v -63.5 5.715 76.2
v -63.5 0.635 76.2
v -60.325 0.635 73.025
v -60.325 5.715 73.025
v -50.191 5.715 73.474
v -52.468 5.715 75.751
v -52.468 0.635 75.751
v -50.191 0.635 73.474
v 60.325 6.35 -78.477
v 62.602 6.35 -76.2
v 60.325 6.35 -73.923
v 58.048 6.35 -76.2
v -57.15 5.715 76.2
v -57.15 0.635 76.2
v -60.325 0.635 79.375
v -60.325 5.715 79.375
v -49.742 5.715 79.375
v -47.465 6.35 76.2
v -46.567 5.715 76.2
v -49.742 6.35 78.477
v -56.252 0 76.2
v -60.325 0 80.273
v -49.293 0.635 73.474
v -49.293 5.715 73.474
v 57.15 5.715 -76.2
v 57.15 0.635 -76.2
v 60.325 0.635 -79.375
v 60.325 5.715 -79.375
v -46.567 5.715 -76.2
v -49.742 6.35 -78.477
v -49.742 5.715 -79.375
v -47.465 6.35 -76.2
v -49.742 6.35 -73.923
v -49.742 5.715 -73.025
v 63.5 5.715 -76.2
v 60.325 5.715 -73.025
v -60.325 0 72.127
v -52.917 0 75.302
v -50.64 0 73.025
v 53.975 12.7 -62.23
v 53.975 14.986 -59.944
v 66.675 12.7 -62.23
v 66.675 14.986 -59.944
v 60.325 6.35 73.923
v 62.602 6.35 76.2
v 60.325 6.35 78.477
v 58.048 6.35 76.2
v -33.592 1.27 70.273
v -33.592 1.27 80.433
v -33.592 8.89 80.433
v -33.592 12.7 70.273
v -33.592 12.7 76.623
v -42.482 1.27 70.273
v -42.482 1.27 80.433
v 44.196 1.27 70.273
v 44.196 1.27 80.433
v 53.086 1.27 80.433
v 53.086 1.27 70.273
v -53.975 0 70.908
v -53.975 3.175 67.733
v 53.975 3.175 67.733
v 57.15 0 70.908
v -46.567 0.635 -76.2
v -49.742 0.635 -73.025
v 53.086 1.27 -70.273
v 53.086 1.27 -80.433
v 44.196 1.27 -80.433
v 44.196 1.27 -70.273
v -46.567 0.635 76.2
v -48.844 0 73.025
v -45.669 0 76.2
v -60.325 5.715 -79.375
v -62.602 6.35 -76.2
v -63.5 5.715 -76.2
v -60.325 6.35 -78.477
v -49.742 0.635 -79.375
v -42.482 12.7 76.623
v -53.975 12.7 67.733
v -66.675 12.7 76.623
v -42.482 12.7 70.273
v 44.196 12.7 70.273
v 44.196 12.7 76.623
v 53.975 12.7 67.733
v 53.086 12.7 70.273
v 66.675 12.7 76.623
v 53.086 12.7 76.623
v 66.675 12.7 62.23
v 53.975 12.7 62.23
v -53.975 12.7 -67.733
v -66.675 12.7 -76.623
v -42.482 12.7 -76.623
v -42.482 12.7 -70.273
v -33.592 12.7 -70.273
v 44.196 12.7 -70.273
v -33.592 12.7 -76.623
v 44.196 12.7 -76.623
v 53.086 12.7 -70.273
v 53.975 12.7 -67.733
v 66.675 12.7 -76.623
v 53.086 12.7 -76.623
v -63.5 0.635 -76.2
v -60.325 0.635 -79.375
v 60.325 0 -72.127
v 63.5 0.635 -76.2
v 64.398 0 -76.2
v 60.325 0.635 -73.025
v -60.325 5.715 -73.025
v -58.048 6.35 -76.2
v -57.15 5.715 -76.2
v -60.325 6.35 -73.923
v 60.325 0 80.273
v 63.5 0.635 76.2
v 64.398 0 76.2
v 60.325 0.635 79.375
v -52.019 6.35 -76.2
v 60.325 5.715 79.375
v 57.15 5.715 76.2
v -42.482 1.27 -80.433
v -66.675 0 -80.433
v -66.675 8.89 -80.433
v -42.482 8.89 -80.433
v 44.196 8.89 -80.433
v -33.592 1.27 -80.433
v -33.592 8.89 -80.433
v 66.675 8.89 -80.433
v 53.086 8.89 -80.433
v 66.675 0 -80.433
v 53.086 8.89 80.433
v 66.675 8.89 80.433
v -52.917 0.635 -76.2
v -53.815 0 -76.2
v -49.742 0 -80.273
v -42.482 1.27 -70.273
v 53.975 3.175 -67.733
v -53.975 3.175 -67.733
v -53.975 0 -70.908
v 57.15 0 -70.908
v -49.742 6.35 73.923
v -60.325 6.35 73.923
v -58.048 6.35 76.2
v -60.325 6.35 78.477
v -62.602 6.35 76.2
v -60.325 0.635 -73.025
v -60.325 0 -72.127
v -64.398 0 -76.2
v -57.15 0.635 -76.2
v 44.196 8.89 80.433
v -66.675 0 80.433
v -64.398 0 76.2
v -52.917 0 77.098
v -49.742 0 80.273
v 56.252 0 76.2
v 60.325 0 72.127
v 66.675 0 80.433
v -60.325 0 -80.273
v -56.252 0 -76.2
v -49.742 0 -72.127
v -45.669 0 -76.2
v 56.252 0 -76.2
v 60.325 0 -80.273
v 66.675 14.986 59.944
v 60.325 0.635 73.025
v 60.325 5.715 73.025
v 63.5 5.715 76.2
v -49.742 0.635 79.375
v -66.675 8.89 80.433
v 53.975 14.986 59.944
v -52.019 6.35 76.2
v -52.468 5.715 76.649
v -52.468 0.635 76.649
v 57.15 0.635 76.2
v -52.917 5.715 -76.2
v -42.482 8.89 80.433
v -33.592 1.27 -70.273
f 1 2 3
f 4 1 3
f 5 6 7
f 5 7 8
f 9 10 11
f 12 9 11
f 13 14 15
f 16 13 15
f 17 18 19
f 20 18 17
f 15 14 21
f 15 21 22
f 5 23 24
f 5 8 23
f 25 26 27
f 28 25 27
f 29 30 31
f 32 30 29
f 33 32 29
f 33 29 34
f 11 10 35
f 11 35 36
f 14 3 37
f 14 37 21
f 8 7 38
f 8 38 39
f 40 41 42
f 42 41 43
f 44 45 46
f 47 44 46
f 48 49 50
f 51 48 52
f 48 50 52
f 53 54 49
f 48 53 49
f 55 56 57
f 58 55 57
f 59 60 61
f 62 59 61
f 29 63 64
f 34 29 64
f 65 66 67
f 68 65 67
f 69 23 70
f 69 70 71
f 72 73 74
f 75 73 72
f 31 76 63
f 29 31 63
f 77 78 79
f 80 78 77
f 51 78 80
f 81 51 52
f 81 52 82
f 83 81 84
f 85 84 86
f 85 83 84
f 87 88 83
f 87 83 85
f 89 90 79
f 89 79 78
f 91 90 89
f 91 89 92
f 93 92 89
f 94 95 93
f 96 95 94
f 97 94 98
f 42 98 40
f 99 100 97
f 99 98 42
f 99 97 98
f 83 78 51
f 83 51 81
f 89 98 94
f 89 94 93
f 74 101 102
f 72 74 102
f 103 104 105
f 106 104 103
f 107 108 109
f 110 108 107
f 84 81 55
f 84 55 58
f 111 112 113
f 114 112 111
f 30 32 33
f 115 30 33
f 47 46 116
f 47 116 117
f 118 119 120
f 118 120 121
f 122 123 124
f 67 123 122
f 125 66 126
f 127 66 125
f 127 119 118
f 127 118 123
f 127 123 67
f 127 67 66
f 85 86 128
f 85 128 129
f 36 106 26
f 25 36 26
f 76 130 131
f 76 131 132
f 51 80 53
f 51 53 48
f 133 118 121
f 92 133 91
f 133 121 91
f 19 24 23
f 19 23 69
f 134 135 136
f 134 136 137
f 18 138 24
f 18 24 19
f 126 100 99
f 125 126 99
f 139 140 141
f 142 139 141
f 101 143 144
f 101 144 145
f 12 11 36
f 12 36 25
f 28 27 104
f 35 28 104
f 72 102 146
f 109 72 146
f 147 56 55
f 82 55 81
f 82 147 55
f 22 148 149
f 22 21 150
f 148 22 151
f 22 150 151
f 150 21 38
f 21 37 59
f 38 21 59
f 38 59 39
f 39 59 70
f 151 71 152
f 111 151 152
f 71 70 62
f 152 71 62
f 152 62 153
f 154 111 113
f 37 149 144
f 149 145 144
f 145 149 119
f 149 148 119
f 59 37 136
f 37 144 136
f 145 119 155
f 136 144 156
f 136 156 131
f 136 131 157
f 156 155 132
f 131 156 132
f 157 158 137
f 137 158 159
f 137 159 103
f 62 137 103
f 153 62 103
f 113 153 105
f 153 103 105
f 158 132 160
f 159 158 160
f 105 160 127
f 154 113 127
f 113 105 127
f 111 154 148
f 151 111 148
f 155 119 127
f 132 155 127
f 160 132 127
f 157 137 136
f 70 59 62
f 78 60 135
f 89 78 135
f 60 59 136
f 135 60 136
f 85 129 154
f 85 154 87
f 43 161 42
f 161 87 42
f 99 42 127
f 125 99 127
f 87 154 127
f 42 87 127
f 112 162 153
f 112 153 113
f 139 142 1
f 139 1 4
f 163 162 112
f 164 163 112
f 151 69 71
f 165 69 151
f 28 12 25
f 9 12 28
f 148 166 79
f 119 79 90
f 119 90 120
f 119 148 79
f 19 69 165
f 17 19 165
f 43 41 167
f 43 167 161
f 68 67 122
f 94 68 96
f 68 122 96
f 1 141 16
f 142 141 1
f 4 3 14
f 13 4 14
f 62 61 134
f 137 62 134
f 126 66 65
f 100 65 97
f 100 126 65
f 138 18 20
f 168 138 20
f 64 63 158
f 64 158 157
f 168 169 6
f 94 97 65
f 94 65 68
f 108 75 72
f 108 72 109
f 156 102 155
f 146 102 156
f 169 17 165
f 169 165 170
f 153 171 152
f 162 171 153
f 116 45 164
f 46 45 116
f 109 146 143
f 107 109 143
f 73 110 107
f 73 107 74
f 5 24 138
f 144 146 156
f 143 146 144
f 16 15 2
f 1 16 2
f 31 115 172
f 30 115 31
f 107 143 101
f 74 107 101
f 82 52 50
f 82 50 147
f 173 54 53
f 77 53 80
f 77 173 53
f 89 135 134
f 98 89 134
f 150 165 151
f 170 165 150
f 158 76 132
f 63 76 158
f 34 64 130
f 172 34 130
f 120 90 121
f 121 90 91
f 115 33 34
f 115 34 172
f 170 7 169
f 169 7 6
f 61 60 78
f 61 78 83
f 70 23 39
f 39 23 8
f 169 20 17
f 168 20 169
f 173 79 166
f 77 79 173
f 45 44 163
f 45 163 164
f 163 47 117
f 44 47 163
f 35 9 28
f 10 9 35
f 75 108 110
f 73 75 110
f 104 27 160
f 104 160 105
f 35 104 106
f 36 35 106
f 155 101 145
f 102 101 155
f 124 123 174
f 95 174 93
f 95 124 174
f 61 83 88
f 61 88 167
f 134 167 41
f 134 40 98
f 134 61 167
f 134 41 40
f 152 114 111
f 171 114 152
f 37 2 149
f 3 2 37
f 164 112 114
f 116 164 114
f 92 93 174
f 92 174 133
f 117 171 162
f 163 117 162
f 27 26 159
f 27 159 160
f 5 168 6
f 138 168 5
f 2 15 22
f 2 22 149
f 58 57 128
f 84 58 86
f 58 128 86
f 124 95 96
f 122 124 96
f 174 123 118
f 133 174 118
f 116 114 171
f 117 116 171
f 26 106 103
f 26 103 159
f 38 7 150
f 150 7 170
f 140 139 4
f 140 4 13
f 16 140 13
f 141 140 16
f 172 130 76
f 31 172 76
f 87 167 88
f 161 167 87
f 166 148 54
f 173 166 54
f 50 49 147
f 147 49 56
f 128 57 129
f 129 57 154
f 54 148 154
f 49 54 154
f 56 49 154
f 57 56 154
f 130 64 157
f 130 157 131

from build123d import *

# Parameters (mm, degrees)
SKETCH2_W           = 133.35
SKETCH2_H           = 160.866666666
SKETCH2_W_2         = 107.95
SKETCH2_H_2         = 135.466666666
BOSS_EXTRUDE1_DEPTH = 12.7
CUT_EXTRUDE1_DEPTH  = 6.35
CHAMFER1_SIZE       = 0.635
CHAMFER3_SIZE       = 3.81
SKETCH5_W           = 8.89
SKETCH5_H           = 11.43
CUT_EXTRUDE2_DEPTH  = 10.16
SKETCH6_W           = 8.89
SKETCH6_H           = 11.43
CUT_EXTRUDE3_DEPTH  = 10.16
CHAMFER4_SIZE       = 3.175
SKETCH7_W           = 12.7
SKETCH7_H           = 124.46
BOSS_EXTRUDE2_DEPTH = 2.286
CHAMFER5_SIZE       = 2.286


with BuildPart() as part:
    # Sketch2 → Boss-Extrude1 (new body)
    with BuildSketch(Plane(origin=(0, 0, 0), x_dir=(1, 0, 0), z_dir=(0, 1, 0))):
        Rectangle(SKETCH2_W, SKETCH2_H)
        Rectangle(SKETCH2_W_2, SKETCH2_H_2, mode=Mode.SUBTRACT)
    extrude(amount=BOSS_EXTRUDE1_DEPTH)

    # Sketch4 → Cut-Extrude1 (cut)
    with BuildSketch(Plane(origin=(0, 0, 0), x_dir=(1, 0, 0), z_dir=(0, 1, 0))):
        Polygon((-63.5, 76.2), (-60.325, 79.375), (-57.15, 76.2), (-60.325, 73.025), align=None)
        Polygon((-52.916666667, 76.2), (-49.741666667, 79.375), (-46.566666667, 76.2), (-49.741666667, 73.025), align=None)
        Polygon((57.15, 76.2), (60.325, 79.375), (63.5, 76.2), (60.325, 73.025), align=None)
        Polygon((57.15, -76.2), (60.325, -73.025), (63.5, -76.2), (60.325, -79.375), align=None)
        Polygon((-52.916666667, -76.2), (-49.741666667, -73.025), (-46.566666667, -76.2), (-49.741666667, -79.375), align=None)
        Polygon((-63.5, -76.2), (-60.325, -73.025), (-57.15, -76.2), (-60.325, -79.375), align=None)
    extrude(amount=CUT_EXTRUDE1_DEPTH, mode=Mode.SUBTRACT)

    # Chamfer1
    chamfer1_edges = [part.edges().sort_by_distance(p)[0] for p in [
        (-61.9125, 0, 77.7875),
        (-58.7375, 0, 77.7875),
        (-58.7375, 0, 74.6125),
        (-61.9125, 0, 74.6125),
        (-61.9125, 6.35, 77.7875),
        (-58.7375, 6.35, 77.7875),
        (-58.7375, 6.35, 74.6125),
        (-61.9125, 6.35, 74.6125),
        (-51.329166667, 0, 77.7875),
        (-52.916666667, 3.175, 76.2),
        (-48.154166667, 0, 77.7875),
        (-48.154166667, 0, 74.6125),
        (-51.329166667, 0, 74.6125),
        (-49.741666667, 3.175, 73.025),
        (-51.329166667, 6.35, 77.7875),
        (-48.154166667, 6.35, 77.7875),
        (-48.154166667, 6.35, 74.6125),
        (-51.329166667, 6.35, 74.6125),
        (58.7375, 0, 77.7875),
        (61.9125, 0, 77.7875),
        (61.9125, 0, 74.6125),
        (58.7375, 0, 74.6125),
        (58.7375, 6.35, 77.7875),
        (61.9125, 6.35, 77.7875),
        (61.9125, 6.35, 74.6125),
        (58.7375, 6.35, 74.6125),
        (58.7375, 0, -74.6125),
        (61.9125, 0, -74.6125),
        (61.9125, 0, -77.7875),
        (58.7375, 0, -77.7875),
        (58.7375, 6.35, -74.6125),
        (61.9125, 6.35, -74.6125),
        (61.9125, 6.35, -77.7875),
        (58.7375, 6.35, -77.7875),
        (-51.329166667, 0, -74.6125),
        (-48.154166667, 0, -74.6125),
        (-48.154166667, 0, -77.7875),
        (-51.329166667, 0, -77.7875),
        (-51.329166667, 6.35, -74.6125),
        (-48.154166667, 6.35, -74.6125),
        (-48.154166667, 6.35, -77.7875),
        (-51.329166667, 6.35, -77.7875),
        (-61.9125, 0, -74.6125),
        (-58.7375, 0, -74.6125),
        (-58.7375, 0, -77.7875),
        (-61.9125, 0, -77.7875),
        (-61.9125, 6.35, -74.6125),
        (-58.7375, 6.35, -74.6125),
        (-58.7375, 6.35, -77.7875),
        (-61.9125, 6.35, -77.7875),
    ]]
    chamfer(chamfer1_edges, length=CHAMFER1_SIZE)

    # Chamfer3
    chamfer3_edges = [part.edges().sort_by_distance(p)[0] for p in [
        (0, 12.7, -80.433333333),
        (0, 12.7, 80.433333333),
    ]]
    chamfer(chamfer3_edges, length=CHAMFER3_SIZE)

    # Sketch5 → Cut-Extrude2 (cut)
    with BuildSketch(Plane.XY.offset(80.433333333)):
        with Locations((-38.0365, 6.985)):
            Rectangle(SKETCH5_W, SKETCH5_H)
        with Locations((48.641, 6.985)):
            Rectangle(SKETCH5_W, SKETCH5_H)
    extrude(amount=-CUT_EXTRUDE2_DEPTH, mode=Mode.SUBTRACT)

    # Sketch6 → Cut-Extrude3 (cut)
    with BuildSketch(Plane(origin=(0, 0, -80.433333333), x_dir=(-1, 0, 0), z_dir=(0, 0, -1))):
        with Locations((38.0365, 6.985)):
            Rectangle(SKETCH6_W, SKETCH6_H)
        with Locations((-48.641, 6.985)):
            Rectangle(SKETCH6_W, SKETCH6_H)
    extrude(amount=-CUT_EXTRUDE3_DEPTH, mode=Mode.SUBTRACT)

    # Chamfer4
    chamfer4_edges = [part.edges().sort_by_distance(p)[0] for p in [
        (53.975, 0, 0),
        (0, 0, -67.733333333),
        (0, 0, 67.733333333),
    ]]
    chamfer(chamfer4_edges, length=CHAMFER4_SIZE)

    # Sketch7 → Boss-Extrude2 (add)
    with BuildSketch(Plane(origin=(0, 12.7, 0), x_dir=(1, 0, 0), z_dir=(0, 1, 0))):
        with Locations((60.325, 0)):
            Rectangle(SKETCH7_W, SKETCH7_H)
    extrude(amount=BOSS_EXTRUDE2_DEPTH)

    # Chamfer5
    chamfer5_edges = [part.edges().sort_by_distance(p)[0] for p in [
        (60.325, 14.986, 62.23),
        (60.325, 14.986, -62.23),
    ]]
    chamfer(chamfer5_edges, length=CHAMFER5_SIZE - 0.0001)  # a hair under: the kernel refuses the full size


solid = part.part
